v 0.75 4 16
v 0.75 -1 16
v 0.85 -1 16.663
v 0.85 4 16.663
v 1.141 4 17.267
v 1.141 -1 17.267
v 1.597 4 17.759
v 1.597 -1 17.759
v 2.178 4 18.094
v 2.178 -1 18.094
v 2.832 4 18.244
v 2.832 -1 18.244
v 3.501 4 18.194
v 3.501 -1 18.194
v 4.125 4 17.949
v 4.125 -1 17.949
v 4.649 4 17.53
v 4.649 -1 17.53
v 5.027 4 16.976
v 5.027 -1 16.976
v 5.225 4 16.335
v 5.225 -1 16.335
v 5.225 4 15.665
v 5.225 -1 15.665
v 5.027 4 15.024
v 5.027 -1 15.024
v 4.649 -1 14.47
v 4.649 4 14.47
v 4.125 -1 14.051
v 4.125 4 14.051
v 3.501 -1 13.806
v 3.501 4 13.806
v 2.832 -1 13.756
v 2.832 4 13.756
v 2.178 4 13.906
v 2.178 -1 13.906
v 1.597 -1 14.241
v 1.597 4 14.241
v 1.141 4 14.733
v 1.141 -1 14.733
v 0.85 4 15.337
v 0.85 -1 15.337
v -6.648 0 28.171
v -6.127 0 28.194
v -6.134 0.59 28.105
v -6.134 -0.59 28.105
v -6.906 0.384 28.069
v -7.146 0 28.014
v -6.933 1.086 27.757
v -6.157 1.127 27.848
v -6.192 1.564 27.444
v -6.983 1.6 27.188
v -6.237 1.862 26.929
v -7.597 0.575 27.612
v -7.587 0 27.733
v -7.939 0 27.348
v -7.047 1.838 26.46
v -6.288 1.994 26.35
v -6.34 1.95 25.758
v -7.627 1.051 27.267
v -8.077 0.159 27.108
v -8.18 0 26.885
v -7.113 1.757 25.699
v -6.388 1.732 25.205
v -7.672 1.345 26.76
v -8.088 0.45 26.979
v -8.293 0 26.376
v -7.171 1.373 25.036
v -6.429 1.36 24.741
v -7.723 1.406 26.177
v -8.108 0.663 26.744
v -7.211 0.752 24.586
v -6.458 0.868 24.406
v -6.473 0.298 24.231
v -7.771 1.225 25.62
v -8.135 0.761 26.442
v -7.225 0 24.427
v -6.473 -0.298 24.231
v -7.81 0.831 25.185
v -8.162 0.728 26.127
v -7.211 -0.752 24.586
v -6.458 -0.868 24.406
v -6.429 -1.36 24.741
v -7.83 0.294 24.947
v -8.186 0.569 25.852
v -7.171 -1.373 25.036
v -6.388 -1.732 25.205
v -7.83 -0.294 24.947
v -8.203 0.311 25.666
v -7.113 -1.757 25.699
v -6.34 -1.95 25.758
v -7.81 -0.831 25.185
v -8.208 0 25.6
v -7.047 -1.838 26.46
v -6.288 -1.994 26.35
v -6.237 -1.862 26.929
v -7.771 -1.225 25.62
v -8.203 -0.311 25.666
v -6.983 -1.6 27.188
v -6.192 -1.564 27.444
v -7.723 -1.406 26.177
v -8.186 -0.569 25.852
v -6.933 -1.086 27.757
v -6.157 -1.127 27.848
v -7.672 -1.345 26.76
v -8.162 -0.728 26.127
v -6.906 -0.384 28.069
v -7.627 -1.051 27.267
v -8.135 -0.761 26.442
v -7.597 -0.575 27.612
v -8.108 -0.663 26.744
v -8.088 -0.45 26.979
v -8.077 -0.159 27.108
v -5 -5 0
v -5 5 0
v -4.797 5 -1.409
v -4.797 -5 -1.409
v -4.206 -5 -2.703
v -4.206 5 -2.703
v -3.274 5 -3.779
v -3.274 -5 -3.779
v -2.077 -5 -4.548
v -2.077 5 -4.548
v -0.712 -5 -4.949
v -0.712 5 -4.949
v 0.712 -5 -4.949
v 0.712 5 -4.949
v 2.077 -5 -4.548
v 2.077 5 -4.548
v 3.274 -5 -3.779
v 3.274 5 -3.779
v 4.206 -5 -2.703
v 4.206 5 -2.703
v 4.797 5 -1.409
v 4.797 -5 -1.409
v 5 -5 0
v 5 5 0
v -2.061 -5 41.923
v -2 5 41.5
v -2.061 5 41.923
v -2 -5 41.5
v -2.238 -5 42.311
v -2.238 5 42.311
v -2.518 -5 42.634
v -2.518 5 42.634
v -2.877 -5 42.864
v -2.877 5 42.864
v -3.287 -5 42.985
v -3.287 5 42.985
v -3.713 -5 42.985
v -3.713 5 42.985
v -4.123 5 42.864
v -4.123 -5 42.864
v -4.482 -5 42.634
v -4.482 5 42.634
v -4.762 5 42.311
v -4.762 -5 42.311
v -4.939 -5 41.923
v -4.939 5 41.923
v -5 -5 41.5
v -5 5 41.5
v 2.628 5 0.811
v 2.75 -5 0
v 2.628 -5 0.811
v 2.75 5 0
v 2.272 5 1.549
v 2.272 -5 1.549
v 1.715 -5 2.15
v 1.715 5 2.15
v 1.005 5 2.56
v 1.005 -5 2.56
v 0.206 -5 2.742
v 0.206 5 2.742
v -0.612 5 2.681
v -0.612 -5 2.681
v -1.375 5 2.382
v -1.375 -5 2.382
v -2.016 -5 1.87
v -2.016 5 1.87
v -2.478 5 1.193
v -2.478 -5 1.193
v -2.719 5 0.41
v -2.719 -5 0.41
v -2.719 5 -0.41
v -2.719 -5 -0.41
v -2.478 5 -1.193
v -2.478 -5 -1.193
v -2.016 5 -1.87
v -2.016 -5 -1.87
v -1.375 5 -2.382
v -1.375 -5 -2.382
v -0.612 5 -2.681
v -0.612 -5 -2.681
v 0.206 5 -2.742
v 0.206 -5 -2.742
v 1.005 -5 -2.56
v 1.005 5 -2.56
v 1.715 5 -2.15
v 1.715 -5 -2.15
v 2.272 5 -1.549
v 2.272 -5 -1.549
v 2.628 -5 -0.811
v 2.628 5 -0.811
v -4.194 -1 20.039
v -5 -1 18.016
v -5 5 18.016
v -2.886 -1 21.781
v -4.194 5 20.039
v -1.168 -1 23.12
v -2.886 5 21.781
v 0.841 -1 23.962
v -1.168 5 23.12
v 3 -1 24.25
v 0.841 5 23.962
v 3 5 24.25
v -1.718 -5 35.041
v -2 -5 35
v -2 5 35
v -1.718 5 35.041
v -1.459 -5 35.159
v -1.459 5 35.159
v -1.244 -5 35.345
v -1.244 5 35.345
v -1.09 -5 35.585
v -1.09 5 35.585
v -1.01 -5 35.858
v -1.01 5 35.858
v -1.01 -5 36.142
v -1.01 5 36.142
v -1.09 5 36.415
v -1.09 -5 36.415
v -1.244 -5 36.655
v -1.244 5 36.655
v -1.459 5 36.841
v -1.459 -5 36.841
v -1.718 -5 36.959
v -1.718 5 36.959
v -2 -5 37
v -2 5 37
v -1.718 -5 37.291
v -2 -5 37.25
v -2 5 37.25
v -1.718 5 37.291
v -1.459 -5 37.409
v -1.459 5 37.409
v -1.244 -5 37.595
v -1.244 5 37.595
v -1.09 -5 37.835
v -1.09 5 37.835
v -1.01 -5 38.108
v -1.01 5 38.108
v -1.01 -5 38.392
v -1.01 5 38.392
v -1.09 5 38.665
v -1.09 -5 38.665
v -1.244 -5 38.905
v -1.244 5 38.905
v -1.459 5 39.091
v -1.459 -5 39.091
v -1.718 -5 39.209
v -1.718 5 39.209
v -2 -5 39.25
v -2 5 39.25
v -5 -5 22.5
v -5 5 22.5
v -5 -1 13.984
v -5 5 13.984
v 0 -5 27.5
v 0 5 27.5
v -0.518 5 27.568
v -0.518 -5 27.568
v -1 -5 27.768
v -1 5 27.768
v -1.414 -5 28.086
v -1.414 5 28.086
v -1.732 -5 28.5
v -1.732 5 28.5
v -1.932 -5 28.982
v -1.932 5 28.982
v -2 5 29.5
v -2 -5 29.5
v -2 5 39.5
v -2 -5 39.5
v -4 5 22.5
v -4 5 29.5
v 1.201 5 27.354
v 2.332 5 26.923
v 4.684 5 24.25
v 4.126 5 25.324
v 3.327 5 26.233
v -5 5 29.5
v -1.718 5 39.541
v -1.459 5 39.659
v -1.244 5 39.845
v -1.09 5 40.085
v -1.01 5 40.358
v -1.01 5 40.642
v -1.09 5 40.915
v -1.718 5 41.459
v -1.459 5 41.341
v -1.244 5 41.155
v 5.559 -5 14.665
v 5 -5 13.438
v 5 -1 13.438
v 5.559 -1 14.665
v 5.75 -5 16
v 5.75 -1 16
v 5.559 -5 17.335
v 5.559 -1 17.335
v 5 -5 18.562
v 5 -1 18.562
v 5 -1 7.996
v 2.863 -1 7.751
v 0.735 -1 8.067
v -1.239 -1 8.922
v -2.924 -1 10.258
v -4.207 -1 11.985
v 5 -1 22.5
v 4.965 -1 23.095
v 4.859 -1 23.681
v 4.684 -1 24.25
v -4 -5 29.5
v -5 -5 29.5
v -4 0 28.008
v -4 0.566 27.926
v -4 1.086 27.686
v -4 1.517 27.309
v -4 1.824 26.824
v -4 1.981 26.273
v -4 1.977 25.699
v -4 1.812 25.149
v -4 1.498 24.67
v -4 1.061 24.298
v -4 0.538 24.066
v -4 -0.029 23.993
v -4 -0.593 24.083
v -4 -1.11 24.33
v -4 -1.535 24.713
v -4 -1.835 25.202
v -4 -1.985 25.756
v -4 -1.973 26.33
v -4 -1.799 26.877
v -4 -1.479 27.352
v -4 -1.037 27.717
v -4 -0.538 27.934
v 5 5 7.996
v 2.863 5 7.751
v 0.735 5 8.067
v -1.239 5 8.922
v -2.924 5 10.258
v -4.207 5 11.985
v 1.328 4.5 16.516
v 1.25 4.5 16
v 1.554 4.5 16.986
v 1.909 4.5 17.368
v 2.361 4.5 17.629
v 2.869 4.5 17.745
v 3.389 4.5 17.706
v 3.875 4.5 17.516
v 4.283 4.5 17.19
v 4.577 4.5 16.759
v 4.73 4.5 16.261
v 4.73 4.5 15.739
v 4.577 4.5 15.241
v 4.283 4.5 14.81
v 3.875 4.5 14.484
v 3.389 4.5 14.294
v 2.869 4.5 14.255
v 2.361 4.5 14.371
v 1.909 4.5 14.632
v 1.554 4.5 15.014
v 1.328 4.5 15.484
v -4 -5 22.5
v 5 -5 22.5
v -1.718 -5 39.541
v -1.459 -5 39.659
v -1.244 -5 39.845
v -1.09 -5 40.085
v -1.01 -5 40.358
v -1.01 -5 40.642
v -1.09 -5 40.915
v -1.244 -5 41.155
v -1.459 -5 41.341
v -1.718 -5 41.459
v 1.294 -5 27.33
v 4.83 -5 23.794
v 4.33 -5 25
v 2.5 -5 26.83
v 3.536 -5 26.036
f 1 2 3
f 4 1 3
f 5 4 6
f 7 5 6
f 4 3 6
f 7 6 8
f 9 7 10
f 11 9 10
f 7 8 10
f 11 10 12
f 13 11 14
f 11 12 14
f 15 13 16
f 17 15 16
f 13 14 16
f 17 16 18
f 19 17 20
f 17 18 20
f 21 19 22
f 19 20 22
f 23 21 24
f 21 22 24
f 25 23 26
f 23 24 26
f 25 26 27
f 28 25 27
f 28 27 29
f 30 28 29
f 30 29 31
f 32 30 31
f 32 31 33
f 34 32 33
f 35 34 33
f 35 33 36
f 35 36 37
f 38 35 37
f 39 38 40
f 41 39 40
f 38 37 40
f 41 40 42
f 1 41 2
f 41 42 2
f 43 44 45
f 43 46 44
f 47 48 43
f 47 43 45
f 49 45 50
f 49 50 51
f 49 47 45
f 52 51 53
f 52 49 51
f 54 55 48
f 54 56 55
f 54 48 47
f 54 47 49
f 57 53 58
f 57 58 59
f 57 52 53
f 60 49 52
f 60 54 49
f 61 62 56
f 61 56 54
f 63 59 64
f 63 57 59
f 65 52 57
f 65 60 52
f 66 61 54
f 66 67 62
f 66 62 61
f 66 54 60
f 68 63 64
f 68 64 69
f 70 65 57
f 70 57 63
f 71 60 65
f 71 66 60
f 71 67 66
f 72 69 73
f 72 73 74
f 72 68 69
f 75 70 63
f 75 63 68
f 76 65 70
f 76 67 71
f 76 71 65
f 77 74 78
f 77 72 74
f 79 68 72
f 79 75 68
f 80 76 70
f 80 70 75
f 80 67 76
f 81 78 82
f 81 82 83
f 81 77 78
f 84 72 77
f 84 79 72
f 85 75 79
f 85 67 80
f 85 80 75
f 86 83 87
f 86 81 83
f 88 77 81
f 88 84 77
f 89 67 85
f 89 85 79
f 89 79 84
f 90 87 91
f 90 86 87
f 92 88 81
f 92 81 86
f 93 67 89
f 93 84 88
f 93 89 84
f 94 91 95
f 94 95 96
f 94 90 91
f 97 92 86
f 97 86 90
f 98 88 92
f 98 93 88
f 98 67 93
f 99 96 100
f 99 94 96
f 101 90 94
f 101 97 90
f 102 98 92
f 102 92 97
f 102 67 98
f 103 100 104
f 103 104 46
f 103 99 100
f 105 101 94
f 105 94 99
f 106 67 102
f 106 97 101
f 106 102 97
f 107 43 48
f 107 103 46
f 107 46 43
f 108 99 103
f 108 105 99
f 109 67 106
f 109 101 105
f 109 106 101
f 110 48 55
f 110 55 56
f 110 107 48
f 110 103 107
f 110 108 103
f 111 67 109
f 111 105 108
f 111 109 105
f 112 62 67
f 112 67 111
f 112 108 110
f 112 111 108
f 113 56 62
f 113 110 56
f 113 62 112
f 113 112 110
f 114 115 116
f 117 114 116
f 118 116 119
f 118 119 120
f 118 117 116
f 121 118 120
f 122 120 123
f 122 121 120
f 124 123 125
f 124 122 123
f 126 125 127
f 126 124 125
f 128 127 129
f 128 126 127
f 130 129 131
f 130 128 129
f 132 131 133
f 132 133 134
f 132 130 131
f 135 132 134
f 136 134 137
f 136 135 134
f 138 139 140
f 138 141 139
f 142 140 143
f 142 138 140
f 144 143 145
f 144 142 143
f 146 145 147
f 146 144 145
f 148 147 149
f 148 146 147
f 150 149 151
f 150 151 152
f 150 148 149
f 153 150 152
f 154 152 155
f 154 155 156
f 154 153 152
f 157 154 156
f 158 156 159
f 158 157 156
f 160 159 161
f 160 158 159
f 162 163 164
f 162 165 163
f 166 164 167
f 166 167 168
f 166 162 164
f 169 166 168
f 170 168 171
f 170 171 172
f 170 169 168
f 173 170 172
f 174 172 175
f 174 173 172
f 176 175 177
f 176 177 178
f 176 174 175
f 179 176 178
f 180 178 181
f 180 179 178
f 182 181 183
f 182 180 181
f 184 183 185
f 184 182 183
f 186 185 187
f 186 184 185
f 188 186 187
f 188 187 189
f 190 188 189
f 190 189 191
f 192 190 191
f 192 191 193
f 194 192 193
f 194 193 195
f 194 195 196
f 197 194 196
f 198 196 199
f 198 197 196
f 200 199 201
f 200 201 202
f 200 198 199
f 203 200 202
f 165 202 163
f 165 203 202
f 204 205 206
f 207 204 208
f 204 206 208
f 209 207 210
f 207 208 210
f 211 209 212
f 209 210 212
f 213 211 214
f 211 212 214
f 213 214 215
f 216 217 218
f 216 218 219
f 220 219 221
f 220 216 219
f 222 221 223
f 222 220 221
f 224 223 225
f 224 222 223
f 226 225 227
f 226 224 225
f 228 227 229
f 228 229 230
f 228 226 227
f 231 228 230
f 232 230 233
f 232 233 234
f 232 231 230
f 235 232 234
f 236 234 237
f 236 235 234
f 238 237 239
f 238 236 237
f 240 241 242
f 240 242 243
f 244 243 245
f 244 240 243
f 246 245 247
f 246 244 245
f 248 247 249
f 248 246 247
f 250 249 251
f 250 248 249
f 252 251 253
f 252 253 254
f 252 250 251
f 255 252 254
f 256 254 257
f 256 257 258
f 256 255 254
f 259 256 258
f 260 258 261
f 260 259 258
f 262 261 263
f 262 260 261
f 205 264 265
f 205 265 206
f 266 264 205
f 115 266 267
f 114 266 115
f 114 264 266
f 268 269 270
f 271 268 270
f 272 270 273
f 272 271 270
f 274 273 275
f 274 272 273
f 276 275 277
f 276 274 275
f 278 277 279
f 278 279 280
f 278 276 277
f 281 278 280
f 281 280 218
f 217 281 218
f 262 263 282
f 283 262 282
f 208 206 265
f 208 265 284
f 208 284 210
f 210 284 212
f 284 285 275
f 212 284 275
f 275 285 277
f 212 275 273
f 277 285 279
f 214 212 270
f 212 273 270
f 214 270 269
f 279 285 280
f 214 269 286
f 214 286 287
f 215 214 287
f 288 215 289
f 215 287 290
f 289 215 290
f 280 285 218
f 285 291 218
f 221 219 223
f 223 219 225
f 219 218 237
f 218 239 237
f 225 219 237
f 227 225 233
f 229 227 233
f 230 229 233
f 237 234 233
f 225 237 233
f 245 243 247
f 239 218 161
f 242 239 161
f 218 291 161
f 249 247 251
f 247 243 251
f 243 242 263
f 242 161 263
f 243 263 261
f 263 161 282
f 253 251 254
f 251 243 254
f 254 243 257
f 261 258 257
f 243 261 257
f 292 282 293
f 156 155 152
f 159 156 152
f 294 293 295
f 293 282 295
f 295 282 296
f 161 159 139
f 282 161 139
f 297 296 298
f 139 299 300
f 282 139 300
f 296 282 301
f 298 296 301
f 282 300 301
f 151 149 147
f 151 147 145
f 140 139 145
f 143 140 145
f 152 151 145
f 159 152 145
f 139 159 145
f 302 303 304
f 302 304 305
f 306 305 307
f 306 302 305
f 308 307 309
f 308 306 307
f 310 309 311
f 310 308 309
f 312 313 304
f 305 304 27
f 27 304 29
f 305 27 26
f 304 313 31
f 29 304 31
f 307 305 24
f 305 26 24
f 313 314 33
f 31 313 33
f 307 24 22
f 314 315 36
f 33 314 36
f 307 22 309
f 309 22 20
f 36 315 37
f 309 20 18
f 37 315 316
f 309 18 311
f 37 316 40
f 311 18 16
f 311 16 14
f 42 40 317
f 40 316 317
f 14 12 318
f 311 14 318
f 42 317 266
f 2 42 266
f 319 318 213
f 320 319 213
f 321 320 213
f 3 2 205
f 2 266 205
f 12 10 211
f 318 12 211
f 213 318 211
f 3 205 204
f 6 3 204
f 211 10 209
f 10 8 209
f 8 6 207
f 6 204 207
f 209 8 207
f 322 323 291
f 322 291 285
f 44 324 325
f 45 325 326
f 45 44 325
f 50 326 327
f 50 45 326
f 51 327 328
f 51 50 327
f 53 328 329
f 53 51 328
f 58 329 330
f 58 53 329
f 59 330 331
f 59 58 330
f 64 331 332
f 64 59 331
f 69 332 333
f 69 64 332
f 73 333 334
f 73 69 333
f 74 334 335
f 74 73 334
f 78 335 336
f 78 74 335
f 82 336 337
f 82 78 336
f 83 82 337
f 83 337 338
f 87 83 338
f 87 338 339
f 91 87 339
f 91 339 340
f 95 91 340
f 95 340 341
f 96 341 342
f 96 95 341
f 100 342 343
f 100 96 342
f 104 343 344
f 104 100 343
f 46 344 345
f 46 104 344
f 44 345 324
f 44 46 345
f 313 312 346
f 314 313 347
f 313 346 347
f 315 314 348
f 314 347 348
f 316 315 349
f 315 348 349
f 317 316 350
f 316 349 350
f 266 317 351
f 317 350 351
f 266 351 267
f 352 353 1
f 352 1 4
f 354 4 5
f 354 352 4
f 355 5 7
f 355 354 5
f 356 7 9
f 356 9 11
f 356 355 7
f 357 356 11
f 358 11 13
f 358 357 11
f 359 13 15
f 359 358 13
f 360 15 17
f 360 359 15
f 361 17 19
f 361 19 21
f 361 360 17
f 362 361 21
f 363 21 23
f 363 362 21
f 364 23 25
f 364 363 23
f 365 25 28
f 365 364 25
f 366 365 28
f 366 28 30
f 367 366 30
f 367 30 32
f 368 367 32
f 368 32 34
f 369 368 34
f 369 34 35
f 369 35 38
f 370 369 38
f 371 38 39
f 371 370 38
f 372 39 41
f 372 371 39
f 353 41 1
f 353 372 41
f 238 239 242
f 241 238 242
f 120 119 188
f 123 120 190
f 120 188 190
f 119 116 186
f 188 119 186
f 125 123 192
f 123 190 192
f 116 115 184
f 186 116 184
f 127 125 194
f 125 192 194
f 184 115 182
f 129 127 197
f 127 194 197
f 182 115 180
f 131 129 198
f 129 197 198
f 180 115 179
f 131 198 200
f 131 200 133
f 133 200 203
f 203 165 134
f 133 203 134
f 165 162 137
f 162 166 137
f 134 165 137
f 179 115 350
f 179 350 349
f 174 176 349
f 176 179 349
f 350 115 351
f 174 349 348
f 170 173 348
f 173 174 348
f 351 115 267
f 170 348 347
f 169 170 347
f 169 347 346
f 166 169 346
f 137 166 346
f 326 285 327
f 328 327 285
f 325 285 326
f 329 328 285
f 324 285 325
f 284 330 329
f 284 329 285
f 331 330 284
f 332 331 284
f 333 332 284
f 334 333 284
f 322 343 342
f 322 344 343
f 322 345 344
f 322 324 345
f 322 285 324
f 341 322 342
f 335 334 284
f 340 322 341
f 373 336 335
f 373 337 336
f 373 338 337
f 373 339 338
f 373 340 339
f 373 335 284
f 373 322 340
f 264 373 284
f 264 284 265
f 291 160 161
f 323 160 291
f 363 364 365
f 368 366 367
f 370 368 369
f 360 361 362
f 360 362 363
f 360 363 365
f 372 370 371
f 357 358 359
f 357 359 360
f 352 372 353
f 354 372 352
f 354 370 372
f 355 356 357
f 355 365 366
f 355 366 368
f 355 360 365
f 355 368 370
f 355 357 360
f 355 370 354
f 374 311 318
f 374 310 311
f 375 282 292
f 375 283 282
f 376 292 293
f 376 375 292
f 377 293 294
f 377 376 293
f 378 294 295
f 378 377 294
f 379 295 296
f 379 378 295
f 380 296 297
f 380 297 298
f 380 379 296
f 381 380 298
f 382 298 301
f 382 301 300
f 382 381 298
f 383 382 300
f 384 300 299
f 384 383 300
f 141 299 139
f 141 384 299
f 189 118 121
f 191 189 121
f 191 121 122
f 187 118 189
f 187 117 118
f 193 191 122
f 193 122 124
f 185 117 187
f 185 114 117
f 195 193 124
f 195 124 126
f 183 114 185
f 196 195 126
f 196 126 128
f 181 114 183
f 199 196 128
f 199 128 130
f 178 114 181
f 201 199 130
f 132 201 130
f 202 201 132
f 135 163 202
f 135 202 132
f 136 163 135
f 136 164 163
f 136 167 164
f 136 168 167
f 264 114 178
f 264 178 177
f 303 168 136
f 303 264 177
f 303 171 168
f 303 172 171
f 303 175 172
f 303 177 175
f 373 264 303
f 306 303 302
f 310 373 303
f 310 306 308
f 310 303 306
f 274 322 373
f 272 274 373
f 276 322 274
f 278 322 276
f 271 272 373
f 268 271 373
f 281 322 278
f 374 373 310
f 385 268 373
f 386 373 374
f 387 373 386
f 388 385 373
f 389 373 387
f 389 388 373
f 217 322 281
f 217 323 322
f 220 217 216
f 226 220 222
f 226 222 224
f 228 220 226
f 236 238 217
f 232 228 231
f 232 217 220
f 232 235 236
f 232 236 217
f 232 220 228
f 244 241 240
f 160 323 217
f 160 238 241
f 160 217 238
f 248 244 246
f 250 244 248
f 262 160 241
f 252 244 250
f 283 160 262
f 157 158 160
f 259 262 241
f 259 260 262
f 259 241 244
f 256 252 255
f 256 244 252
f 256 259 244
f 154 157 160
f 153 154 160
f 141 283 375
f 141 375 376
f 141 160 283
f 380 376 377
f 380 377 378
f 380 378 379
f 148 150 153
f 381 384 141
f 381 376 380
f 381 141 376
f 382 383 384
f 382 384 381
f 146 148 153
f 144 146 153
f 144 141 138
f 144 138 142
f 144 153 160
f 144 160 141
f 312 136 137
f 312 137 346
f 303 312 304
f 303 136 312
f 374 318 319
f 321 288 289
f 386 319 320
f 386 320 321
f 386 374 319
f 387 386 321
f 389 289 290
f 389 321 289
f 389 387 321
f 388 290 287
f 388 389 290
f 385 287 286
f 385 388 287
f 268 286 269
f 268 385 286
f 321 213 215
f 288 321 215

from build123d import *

# Parameters (mm, degrees)
F0_R      = 2.75
F1_DEPTH  = 5
F5_W      = 6
F5_H      = 8.25
F7_DEPTH  = 2.751
F8_R      = 4.99999
F9_R      = 2.25
F10_DEPTH = 5.5
F11_SIZE  = 0.5


# Not quite as in the source:
# - a fillet or chamfer is up to 0.001 mm smaller than in the source, because OpenCascade refuses the exact size


with BuildPart() as f1:
    # F0 (on Front) → F1 (new body, symmetric)
    with BuildSketch(Plane.XZ):
        with BuildLine():
            ThreePointArc((-2, 41.5), (-3.5, 43), (-5, 41.5))
            Line((-5, 41.5), (-5, 29.5))
            Line((-5, 29.5), (-4, 29.5))
            Line((-4, 29.5), (-4, 22.5))
            Line((-4, 22.5), (-5, 22.5))
            Line((-5, 22.5), (-5, 0))
            ThreePointArc((-5, 0), (0, -5), (5, 0))
            Line((5, 0), (5, 13.4382623085))
            ThreePointArc((5, 13.4382623085), (5.75, 16), (5, 18.5617376915))
            Line((5, 18.5617376915), (5, 27.5))
            Line((5, 27.5), (0, 27.5))
            ThreePointArc((0, 27.5), (-1.4142135624, 28.0857864376), (-2, 29.5))
            Line((-2, 29.5), (-2, 35))
            Line((-2, 35), (-2, 37))
            Line((-2, 37), (-2, 37.25))
            Line((-2, 37.25), (-2, 39.25))
            Line((-2, 39.25), (-2, 39.5))
            Line((-2, 39.5), (-2, 41.5))
        make_face()
        Circle(F0_R, mode=Mode.SUBTRACT)
        with BuildLine():
            ThreePointArc((-2, 39.5), (-1, 40.5), (-2, 41.5))
            Line((-2, 41.5), (-2, 39.5))
        make_face()
        with BuildLine():
            ThreePointArc((-2, 37.25), (-1, 38.25), (-2, 39.25))
            Line((-2, 39.25), (-2, 37.25))
        make_face()
        with BuildLine():
            ThreePointArc((-2, 35), (-1, 36), (-2, 37))
            Line((-2, 37), (-2, 35))
        make_face()
    extrude(amount=F1_DEPTH, both=True)

    # F2 (on Front) → F3 (revolve)
    with BuildSketch(Plane.XZ):
        with BuildLine():
            Line((-3.3124492232, 25.9398471014), (-3.1381377377, 27.9322364976))
            Line((-3.1381377377, 27.9322364976), (-6.126721832, 28.1937037259))
            ThreePointArc((-6.126721832, 28.1937037259), (-7.5866085368, 27.7334032159), (-8.2934227136, 26.3756258152))
            Line((-8.2934227136, 26.3756258152), (-3.3124492232, 25.9398471014))
        make_face()
    revolve(axis=Axis((-3.9560072501, 0, 25.9961511331), (-0.9961946981, 0, 0.0871557427)))

    # F5 (on offset) → F6 (revolve, cut)
    with BuildSketch(Plane.YZ.offset(3)):
        with Locations((2, 20.125)):
            Rectangle(F5_W, F5_H)
    revolve(axis=Axis((3, 0.0511605343, 16), (0, 1, 0)), mode=Mode.SUBTRACT)

    # F5 (on offset) → F7 (cut, through all)
    with BuildSketch(Plane.YZ.offset(3)):
        with Locations((2, 20.125)):
            Rectangle(F5_W, F5_H)
    extrude(amount=F7_DEPTH, mode=Mode.SUBTRACT)

    # F8 (radius 5 in the source; OpenCascade refuses exactly that, so slightly less here)
    f8_edges = [f1.edges().sort_by_distance(p)[0] for p in [
        (5, 0, 27.5),
    ]]
    fillet(f8_edges, radius=F8_R)

    # F9 (on face) → F10 (join)
    with BuildSketch(Plane(origin=(0, -1, 0), x_dir=(-1, 0, 0), z_dir=(0, 1, 0))):
        with Locations((-3, 16)):
            Circle(F9_R)
    extrude(amount=F10_DEPTH)

    # F11
    f11_edges = [f1.edges().sort_by_distance(p)[0] for p in [
        (5.25, 4.5, 16),
    ]]
    chamfer(f11_edges, length=F11_SIZE)


solid = f1.part
